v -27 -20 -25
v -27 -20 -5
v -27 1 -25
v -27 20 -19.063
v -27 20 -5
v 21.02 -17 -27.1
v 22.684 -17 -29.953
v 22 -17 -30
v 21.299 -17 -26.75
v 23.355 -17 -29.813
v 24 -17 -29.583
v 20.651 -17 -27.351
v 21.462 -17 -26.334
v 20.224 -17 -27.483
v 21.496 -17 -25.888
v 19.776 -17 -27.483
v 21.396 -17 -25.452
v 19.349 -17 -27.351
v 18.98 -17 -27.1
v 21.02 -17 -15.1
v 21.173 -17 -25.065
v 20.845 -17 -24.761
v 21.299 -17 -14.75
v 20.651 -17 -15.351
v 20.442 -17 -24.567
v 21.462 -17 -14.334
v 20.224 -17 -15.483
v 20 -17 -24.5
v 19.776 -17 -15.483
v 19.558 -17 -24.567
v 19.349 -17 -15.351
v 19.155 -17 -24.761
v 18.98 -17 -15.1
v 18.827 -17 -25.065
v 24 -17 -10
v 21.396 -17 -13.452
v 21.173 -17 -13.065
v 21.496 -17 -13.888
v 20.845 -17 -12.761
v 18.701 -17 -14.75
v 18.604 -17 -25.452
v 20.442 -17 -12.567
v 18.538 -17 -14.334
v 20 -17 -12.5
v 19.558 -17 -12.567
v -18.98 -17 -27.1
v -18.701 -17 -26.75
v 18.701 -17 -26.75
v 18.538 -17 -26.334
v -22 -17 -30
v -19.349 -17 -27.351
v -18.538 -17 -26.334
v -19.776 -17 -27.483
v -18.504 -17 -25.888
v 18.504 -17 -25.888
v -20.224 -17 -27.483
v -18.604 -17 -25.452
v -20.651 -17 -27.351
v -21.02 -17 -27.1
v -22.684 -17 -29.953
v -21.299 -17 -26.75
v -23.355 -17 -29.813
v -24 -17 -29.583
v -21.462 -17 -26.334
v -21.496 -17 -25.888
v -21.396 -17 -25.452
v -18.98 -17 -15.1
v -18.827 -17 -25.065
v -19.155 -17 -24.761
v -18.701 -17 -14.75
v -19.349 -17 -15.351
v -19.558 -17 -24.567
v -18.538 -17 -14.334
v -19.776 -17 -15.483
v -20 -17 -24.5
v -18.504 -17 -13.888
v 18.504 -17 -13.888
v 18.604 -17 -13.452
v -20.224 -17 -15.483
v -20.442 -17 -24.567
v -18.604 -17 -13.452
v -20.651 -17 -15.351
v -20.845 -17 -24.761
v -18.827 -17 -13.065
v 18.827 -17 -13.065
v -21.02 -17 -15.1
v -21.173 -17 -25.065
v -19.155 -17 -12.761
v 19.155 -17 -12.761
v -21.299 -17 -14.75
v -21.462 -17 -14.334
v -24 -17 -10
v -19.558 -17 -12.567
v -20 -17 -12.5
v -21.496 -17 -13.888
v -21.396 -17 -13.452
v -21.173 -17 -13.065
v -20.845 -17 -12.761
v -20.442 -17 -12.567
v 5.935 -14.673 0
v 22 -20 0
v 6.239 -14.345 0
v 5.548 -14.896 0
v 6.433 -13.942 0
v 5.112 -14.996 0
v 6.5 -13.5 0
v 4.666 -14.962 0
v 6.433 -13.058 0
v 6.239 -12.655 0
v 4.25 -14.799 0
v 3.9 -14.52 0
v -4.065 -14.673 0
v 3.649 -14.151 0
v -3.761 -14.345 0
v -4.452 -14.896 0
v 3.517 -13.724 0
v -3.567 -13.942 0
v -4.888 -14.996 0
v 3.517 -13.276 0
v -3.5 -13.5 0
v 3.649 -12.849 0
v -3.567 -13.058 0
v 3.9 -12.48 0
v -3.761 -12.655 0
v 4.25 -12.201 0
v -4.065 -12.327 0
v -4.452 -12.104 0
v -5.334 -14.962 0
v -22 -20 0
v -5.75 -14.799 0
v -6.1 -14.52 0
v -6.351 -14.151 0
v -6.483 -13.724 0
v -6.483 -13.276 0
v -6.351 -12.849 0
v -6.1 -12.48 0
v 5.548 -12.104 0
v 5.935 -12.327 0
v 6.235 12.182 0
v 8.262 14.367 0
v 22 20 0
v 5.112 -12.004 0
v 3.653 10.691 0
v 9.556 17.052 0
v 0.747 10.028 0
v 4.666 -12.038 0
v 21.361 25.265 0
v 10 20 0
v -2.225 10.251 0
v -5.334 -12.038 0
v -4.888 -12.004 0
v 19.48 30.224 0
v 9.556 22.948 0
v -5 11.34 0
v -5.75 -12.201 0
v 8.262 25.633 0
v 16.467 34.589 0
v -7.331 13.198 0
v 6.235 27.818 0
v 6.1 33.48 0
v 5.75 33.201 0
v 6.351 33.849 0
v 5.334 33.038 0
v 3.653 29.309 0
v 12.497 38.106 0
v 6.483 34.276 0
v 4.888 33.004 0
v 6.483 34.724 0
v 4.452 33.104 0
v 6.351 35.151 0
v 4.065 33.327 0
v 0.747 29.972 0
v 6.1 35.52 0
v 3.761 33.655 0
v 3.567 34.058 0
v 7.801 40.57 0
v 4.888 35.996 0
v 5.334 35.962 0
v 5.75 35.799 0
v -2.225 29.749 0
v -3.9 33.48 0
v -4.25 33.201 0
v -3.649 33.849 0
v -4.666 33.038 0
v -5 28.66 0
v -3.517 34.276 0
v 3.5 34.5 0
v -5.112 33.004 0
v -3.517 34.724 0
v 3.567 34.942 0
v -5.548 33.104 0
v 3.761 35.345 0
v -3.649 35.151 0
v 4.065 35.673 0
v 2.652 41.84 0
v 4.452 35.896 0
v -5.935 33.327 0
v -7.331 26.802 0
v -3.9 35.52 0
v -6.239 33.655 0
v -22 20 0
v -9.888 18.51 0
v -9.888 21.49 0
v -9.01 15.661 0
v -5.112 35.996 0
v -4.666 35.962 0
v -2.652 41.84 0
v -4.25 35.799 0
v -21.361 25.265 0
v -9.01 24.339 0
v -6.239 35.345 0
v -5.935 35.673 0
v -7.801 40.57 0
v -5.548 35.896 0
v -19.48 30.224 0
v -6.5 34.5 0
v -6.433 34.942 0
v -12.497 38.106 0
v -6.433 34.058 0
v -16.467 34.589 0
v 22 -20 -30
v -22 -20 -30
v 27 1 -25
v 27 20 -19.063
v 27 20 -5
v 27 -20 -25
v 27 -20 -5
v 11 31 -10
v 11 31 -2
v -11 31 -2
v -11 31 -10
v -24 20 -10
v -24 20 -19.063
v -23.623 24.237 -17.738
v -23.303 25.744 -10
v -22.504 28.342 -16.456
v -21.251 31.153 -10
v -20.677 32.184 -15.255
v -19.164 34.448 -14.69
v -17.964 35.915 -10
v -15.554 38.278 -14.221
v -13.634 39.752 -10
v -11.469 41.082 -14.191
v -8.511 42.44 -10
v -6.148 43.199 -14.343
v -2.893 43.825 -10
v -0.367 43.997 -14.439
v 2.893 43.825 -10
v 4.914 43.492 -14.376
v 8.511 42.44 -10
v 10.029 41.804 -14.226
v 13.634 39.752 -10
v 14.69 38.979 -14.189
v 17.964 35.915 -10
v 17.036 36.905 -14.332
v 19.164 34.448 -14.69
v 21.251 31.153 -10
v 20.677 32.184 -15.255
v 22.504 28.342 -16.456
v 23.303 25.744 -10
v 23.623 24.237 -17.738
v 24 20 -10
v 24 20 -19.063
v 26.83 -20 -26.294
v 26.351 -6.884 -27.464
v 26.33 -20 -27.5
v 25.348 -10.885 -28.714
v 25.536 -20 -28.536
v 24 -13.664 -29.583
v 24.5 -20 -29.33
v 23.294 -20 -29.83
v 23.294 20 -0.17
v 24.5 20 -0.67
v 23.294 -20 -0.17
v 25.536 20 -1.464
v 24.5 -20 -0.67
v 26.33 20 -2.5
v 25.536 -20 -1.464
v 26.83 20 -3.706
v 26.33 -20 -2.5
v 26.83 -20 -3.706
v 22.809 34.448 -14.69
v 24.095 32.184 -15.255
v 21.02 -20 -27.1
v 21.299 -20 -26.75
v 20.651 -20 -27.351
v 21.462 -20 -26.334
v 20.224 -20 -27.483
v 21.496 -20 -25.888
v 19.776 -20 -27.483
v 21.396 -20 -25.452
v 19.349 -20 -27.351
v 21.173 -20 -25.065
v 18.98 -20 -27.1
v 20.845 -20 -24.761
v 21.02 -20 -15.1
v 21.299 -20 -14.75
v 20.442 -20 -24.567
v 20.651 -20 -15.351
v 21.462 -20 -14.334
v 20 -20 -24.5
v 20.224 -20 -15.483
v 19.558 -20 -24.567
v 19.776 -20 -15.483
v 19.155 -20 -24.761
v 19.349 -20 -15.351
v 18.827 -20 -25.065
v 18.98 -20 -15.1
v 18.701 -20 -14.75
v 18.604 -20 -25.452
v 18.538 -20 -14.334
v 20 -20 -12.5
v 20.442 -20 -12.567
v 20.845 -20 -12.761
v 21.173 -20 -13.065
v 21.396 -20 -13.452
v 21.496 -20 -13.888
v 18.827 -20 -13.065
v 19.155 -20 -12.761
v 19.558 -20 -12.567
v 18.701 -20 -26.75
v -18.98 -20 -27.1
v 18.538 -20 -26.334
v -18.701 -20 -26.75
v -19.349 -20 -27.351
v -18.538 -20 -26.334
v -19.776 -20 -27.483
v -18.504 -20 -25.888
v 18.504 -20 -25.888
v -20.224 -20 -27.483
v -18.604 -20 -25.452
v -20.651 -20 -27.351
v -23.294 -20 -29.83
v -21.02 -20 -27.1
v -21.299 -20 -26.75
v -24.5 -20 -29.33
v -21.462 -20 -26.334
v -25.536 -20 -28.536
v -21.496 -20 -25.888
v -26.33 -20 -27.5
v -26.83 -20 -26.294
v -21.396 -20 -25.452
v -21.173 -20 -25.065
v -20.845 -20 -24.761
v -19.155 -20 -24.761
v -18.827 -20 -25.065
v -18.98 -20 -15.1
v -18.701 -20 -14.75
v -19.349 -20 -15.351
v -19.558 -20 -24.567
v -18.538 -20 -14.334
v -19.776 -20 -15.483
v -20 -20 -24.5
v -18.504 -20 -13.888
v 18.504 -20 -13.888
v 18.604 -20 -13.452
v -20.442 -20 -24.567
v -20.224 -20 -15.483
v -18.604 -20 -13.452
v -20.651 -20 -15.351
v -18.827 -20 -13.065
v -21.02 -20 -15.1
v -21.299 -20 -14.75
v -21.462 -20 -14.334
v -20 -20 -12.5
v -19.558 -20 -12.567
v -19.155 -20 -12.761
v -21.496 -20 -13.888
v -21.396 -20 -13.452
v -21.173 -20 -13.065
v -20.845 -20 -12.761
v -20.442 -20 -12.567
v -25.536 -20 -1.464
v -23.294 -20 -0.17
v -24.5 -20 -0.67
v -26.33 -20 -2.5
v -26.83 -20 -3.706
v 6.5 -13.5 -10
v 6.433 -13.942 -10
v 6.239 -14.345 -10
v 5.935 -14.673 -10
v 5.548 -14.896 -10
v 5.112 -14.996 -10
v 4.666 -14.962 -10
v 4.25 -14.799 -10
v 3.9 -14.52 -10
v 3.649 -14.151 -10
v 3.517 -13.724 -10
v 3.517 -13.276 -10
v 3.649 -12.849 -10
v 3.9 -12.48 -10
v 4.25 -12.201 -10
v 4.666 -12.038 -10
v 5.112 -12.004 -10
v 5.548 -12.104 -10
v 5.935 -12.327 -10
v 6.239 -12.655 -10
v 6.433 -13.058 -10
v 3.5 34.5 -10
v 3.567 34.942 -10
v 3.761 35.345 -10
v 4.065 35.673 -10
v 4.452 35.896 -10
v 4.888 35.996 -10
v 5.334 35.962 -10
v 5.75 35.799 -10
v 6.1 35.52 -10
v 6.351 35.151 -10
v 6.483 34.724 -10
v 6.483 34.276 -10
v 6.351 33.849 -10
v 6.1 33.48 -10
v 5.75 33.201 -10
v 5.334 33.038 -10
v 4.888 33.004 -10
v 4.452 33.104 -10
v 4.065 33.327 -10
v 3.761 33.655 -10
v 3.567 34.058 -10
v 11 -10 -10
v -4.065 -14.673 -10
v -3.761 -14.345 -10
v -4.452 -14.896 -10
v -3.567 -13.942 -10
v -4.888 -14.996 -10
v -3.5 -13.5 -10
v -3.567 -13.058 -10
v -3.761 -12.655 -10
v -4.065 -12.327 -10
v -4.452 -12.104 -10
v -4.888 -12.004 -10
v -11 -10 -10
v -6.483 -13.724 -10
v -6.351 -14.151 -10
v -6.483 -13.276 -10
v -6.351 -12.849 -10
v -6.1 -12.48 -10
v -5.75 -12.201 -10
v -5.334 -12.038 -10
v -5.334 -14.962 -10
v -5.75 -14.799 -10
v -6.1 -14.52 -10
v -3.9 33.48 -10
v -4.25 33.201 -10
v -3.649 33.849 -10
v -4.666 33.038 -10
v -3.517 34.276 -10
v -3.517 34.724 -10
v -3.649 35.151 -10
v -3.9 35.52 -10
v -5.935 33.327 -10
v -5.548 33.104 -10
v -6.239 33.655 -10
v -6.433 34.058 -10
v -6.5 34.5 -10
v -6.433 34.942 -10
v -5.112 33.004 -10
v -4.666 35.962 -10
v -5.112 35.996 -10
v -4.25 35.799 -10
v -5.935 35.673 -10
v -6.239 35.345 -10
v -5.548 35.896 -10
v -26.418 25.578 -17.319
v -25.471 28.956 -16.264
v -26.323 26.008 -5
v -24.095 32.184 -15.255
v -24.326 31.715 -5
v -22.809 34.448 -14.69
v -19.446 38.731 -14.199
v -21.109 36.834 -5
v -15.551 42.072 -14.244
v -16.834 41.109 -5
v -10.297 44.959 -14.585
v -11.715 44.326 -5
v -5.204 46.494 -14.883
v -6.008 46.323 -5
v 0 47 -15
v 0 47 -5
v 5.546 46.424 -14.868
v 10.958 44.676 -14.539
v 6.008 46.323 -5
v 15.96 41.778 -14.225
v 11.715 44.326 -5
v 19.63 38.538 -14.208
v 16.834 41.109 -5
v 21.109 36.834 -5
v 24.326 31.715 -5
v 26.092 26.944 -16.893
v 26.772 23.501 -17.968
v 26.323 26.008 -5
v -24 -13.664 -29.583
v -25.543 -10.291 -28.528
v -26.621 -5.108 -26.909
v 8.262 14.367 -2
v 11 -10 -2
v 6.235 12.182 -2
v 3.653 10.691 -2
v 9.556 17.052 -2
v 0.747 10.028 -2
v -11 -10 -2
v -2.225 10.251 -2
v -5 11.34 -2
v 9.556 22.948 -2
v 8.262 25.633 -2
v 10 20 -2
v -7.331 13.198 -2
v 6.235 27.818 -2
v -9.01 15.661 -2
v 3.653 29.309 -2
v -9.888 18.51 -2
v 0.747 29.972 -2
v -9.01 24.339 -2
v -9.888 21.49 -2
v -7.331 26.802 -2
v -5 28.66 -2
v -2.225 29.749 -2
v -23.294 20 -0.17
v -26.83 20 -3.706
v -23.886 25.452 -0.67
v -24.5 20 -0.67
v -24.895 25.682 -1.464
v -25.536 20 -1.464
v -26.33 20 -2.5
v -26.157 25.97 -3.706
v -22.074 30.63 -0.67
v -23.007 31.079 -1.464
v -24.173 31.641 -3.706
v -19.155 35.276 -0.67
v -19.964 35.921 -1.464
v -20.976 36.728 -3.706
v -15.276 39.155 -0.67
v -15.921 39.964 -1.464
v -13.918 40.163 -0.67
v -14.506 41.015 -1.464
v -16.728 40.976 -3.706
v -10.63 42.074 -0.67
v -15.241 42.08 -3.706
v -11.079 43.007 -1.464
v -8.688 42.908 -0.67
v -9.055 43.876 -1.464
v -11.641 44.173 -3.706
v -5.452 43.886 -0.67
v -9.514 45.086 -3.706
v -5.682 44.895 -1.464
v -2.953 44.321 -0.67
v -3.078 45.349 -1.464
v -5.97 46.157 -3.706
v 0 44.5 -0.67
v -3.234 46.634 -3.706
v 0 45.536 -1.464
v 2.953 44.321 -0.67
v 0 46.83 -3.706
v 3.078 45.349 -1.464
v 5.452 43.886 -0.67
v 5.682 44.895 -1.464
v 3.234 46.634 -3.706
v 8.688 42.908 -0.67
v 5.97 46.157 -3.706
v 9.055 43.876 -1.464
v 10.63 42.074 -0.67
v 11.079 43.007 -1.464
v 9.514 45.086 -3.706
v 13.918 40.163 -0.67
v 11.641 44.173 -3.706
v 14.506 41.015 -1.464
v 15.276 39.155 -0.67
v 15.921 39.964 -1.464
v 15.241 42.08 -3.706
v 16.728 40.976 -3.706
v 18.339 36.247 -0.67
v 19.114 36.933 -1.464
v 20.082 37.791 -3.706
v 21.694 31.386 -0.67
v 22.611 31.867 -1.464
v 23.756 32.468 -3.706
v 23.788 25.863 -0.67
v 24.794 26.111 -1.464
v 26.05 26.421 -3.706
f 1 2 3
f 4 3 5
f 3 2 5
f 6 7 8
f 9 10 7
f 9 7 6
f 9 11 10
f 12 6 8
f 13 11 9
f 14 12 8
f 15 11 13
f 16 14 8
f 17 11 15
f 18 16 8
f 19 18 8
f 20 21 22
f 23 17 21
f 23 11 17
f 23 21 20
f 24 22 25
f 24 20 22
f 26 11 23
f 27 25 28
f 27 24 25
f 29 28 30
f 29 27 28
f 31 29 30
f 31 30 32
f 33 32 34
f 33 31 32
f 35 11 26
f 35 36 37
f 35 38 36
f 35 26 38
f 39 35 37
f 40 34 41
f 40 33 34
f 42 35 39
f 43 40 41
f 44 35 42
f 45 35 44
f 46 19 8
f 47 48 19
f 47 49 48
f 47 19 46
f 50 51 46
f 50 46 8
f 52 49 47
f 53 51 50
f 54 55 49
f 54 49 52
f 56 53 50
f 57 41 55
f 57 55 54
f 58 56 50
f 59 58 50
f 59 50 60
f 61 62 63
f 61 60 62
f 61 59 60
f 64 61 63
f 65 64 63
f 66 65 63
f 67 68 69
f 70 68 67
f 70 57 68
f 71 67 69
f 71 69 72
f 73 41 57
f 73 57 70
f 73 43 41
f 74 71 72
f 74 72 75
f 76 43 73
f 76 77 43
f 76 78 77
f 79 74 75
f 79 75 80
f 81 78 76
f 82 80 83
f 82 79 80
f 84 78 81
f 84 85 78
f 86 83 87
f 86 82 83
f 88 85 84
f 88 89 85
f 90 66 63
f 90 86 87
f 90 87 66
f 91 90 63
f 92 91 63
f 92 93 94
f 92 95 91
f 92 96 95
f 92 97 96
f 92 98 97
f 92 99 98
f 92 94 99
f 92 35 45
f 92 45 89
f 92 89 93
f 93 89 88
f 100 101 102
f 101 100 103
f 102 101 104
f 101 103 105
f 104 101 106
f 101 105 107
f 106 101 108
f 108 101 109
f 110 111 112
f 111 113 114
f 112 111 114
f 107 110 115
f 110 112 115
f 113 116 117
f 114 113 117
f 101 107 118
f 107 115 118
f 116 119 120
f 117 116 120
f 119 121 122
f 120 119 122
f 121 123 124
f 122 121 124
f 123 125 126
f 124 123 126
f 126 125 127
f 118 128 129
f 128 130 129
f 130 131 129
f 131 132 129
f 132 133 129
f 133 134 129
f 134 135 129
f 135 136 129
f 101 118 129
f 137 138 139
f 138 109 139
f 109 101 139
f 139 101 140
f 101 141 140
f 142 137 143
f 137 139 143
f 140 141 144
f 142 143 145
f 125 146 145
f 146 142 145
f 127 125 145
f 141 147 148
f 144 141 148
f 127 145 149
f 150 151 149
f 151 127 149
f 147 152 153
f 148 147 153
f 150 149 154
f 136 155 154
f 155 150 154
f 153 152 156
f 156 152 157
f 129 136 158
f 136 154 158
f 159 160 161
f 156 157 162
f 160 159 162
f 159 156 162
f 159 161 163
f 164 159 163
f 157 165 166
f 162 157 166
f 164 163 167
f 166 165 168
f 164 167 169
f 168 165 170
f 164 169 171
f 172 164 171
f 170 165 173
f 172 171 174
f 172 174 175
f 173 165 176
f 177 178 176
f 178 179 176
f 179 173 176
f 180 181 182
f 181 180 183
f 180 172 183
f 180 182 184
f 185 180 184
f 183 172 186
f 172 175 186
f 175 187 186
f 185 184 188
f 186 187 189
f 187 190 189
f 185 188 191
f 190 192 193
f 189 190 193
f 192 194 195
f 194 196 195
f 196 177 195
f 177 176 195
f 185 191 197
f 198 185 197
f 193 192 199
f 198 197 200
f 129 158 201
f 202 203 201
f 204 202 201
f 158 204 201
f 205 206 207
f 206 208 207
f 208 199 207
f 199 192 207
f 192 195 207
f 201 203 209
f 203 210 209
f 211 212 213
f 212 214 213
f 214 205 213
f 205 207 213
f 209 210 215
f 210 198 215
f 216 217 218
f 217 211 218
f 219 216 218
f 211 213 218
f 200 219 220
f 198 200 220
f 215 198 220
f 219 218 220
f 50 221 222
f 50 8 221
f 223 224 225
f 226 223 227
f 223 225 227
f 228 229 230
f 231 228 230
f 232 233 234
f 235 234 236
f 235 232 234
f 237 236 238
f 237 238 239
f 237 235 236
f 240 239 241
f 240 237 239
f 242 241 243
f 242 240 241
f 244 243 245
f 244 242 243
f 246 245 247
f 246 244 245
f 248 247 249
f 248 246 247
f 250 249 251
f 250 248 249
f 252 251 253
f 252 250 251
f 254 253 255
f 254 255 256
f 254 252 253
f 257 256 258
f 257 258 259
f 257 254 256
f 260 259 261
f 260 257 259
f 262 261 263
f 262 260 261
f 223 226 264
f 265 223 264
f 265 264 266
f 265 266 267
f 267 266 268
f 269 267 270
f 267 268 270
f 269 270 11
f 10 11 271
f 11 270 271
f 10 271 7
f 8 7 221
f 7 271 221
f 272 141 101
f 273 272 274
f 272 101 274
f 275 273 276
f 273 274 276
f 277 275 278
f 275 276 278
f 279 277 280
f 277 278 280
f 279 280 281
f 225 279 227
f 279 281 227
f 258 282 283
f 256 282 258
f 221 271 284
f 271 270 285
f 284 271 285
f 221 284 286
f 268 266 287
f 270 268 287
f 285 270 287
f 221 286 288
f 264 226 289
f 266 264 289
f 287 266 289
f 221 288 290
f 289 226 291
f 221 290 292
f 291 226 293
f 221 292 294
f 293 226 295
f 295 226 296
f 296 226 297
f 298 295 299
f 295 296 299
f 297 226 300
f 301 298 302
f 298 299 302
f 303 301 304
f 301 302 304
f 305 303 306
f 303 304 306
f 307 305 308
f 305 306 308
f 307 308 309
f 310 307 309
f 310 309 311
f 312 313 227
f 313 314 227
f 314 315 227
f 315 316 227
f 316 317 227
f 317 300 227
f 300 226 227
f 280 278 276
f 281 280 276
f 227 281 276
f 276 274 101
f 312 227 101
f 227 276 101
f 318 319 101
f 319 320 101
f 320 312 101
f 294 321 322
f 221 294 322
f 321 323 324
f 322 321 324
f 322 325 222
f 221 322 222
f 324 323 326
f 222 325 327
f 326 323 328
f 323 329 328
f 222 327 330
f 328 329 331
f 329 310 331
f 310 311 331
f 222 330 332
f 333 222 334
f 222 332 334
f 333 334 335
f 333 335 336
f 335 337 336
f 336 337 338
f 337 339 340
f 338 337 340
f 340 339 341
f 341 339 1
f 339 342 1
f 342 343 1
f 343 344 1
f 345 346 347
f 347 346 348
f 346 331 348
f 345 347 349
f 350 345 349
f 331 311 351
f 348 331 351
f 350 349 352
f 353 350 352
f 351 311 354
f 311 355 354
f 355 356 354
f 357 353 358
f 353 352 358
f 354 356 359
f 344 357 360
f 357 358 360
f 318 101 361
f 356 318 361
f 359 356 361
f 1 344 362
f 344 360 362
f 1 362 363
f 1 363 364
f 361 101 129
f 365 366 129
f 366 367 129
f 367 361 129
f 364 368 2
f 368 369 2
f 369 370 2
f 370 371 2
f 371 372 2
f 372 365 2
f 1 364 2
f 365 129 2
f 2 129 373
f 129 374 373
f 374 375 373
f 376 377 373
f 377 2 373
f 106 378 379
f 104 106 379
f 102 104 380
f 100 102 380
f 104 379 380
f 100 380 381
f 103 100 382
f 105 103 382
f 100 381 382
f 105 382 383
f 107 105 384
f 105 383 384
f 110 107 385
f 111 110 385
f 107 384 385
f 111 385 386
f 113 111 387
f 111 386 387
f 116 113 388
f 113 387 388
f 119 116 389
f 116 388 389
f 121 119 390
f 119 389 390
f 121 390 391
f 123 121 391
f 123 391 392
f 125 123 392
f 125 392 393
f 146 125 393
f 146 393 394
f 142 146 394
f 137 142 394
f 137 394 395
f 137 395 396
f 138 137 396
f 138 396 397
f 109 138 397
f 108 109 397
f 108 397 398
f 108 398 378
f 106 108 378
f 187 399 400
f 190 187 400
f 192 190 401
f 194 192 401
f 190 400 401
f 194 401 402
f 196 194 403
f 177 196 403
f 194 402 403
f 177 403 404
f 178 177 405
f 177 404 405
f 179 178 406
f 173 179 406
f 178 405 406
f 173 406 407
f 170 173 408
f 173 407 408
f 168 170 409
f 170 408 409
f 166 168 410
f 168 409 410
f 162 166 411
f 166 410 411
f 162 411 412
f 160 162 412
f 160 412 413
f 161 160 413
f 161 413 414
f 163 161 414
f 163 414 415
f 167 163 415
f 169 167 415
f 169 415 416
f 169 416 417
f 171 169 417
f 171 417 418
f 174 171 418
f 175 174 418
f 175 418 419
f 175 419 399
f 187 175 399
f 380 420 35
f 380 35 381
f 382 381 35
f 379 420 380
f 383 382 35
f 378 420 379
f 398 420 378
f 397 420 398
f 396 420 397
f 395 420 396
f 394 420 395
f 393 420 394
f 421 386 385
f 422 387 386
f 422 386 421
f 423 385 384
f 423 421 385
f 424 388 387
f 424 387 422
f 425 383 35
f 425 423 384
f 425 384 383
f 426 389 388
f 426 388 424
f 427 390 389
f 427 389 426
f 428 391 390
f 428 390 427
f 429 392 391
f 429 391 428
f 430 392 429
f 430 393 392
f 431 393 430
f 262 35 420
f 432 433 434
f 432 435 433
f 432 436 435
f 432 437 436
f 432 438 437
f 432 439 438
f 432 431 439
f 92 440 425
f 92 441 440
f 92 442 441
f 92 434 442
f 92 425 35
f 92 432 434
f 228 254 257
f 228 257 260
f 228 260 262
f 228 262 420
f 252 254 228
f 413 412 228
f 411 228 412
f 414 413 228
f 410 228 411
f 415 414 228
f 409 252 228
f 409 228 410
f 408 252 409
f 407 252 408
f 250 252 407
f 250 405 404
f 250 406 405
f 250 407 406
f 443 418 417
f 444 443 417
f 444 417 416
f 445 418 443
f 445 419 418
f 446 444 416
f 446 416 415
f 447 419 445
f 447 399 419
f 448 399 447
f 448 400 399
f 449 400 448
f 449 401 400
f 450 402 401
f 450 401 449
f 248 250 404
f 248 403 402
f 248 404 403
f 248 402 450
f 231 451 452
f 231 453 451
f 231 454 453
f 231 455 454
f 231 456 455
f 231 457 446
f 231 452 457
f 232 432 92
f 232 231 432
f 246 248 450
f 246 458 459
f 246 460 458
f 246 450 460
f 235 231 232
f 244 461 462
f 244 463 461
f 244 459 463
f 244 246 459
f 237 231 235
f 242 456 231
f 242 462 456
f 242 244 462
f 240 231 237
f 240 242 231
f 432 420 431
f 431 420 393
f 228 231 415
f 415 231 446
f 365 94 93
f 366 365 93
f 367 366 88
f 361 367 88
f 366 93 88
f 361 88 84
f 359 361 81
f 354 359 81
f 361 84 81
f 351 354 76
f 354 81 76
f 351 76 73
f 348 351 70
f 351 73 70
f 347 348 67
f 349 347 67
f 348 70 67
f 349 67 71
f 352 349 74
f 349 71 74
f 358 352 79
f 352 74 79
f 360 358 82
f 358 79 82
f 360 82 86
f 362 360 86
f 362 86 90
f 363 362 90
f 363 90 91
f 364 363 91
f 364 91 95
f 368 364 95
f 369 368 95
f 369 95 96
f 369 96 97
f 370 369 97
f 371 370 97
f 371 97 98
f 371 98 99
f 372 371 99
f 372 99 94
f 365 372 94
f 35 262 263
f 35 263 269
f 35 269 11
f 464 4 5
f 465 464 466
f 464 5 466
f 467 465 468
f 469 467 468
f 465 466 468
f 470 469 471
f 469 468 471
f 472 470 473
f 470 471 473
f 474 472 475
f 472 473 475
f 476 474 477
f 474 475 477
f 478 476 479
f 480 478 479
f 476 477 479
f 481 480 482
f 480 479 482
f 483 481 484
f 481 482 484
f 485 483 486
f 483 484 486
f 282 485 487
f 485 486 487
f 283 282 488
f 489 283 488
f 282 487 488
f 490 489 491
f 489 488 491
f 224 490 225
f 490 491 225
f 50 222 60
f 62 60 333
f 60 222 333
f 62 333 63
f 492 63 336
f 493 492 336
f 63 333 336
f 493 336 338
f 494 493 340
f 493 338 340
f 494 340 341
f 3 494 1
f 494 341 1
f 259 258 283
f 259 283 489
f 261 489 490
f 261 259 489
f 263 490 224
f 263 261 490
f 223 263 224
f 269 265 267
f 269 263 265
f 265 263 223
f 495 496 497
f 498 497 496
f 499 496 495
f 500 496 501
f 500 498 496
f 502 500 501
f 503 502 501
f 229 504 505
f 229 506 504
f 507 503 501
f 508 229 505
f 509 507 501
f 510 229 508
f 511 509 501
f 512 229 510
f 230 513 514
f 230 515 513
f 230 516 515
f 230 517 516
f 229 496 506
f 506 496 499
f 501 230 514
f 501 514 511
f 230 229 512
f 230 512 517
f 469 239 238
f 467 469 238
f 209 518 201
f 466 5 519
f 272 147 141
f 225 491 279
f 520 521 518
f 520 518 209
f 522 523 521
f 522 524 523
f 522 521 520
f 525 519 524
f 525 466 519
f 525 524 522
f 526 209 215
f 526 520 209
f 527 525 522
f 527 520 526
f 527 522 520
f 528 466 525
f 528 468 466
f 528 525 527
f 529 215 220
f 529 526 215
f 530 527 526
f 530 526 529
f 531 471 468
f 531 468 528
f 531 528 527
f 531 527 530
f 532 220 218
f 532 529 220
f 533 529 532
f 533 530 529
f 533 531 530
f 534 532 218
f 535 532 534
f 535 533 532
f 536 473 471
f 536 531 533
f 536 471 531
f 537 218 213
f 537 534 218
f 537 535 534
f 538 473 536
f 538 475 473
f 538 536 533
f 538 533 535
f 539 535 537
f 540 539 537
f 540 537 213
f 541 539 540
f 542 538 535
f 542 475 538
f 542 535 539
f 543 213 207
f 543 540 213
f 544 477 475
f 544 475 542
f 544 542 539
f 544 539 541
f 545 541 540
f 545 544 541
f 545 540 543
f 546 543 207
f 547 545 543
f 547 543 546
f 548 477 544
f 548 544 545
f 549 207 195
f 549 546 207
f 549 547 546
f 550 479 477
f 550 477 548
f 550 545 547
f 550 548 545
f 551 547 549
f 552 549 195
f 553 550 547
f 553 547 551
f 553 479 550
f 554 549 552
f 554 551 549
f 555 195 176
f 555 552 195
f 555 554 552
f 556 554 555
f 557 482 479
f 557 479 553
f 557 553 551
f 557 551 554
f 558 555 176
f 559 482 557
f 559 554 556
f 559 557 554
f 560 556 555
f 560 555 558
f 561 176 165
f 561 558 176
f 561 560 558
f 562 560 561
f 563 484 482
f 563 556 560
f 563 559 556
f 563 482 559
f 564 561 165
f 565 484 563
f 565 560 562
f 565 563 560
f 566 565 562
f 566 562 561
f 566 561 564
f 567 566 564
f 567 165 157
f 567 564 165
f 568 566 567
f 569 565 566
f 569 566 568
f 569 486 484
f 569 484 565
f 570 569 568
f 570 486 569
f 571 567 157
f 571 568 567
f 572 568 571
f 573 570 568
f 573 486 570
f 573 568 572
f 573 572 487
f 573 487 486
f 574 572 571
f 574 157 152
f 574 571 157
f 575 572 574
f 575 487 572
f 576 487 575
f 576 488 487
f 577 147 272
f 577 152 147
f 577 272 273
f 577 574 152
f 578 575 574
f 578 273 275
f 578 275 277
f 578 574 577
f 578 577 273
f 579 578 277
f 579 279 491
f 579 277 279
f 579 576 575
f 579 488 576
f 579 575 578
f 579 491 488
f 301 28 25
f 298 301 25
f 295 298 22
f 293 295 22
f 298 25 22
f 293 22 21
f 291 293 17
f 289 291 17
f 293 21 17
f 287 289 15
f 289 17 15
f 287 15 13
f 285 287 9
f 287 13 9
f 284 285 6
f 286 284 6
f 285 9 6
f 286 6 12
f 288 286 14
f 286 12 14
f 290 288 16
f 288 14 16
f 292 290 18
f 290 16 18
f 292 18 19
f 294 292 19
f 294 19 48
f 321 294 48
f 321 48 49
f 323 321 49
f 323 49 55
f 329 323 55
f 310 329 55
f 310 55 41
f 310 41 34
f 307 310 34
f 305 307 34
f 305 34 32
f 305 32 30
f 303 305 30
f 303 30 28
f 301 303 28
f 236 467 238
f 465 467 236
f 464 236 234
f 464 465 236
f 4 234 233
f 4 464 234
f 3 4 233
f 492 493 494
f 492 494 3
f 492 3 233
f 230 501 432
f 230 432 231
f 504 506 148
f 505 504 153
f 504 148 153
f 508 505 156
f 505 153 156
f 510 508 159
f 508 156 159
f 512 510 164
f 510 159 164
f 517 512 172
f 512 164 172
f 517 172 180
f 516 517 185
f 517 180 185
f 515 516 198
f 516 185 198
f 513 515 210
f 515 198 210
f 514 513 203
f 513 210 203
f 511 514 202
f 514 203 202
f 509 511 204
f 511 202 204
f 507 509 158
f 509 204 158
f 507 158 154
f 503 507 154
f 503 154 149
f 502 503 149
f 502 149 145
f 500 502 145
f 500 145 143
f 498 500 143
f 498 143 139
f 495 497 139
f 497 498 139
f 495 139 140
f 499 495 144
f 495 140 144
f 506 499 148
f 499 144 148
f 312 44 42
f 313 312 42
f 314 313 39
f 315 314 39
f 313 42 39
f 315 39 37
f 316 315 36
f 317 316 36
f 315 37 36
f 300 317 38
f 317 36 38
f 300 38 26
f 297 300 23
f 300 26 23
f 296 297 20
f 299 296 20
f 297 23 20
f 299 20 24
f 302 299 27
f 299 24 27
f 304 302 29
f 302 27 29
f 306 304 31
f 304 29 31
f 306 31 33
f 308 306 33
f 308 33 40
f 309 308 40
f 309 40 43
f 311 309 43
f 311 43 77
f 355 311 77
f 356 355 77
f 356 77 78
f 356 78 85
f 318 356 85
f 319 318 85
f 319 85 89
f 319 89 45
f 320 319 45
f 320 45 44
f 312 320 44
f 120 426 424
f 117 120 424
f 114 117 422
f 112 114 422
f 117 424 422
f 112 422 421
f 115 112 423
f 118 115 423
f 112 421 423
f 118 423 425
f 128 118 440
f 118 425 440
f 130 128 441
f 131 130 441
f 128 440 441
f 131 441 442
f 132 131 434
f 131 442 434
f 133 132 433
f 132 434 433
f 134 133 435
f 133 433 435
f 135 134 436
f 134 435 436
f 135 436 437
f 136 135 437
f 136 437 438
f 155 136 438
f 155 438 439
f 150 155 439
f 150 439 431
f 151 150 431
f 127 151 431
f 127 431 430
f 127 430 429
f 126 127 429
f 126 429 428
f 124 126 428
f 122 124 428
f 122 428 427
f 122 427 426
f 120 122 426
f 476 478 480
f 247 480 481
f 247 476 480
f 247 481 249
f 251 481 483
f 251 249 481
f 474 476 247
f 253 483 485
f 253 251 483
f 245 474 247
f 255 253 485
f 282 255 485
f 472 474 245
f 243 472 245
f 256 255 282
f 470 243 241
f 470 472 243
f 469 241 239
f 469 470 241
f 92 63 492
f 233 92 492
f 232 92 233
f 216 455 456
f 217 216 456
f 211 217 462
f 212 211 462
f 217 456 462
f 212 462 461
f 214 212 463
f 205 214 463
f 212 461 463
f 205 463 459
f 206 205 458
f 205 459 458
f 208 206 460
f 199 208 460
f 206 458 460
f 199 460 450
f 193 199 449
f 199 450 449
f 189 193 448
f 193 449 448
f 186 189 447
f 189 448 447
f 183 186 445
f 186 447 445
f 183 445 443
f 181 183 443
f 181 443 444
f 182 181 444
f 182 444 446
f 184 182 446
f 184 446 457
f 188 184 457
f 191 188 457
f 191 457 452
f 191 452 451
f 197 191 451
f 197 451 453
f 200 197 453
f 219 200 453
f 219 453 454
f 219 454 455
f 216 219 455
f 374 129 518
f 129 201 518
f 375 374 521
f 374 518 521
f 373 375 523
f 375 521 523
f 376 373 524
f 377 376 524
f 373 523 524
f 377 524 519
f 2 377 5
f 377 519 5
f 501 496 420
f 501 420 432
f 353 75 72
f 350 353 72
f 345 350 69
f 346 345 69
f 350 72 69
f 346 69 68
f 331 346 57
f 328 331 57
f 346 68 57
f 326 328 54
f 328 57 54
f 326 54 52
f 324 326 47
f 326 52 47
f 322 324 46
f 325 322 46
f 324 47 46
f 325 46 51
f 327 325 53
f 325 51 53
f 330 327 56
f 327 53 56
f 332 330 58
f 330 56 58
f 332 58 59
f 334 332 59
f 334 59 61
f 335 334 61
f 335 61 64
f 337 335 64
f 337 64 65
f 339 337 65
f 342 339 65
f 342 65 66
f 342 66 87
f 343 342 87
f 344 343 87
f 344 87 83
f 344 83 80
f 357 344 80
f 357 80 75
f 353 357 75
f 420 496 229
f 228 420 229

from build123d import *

# Parameters (mm, degrees)
BOSS_EXTRUDE1_DEPTH     = 30
SKETCH3_4_R             = 10
BOSS_EXTRUDE2_DEPTH     = 10
CUT_EXTRUDE2_DEPTH      = 62.951594007
CUT_EXTRUDE2_DEPTH_BACK = 62.951594007
CUT_EXTRUDE3_START      = -8
SKETCH6_W               = 22
SKETCH6_H               = 41
SKETCH6_R               = 10
CUT_EXTRUDE3_DEPTH      = 8
SKETCH6_3_R             = 1.5
CUT_EXTRUDE4_DEPTH      = 58.775427431
CUT_EXTRUDE5_DEPTH      = 79.217645188
SKETCH8_R               = 1.5
CUT_EXTRUDE6_DEPTH      = 76.663729872
FILLET1_R               = 5


with BuildPart() as part:
    # Sketch3 → Boss-Extrude1 (new body)
    with BuildSketch(Plane.XY):
        with BuildLine():
            Line((-27, 20), (-27, -20))
            Line((-27, -20), (27, -20))
            Line((27, -20), (27, 20))
            ThreePointArc((27, 20), (0, 47), (-27, 20))
        make_face()
        with BuildLine():
            Line((24, -17), (-24, -17))
            Line((-24, -17), (-24, 20))
            ThreePointArc((-24, 20), (0, 44), (24, 20))
            Line((24, 20), (24, -17))
        make_face(mode=Mode.SUBTRACT)
    extrude(amount=-BOSS_EXTRUDE1_DEPTH)

    # Sketch3<4> → Boss-Extrude2 (add)
    with BuildSketch(Plane.XY):
        with BuildLine():
            Line((-24, 20), (-24, -17))
            Line((-24, -17), (24, -17))
            Line((24, -17), (24, 20))
            ThreePointArc((24, 20), (0, 44), (-24, 20))
        make_face()
        with Locations((0, 20)):
            Circle(SKETCH3_4_R, mode=Mode.SUBTRACT)
    extrude(amount=-BOSS_EXTRUDE2_DEPTH)

    # Sketch5 → Cut-Extrude2 (cut, two sides: drawn at the far end of the back side and taken through both)
    with BuildSketch(Plane(origin=(0, 0, 0), x_dir=(0, 0, -1), z_dir=(1, 0, 0)).offset(-CUT_EXTRUDE2_DEPTH_BACK)):
        with BuildLine():
            Line((15.255034443, 32.183889783), (30, -15))
            Line((30, -15), (30, 47))
            Line((30, 47), (15, 47))
            ThreePointArc((15, 47), (14.181044165, 40.740478791), (14.690093427, 34.448168938))
            ThreePointArc((14.690093427, 34.448168938), (14.93950997, 33.307782347), (15.255034443, 32.183889783))
        make_face()
    extrude(amount=CUT_EXTRUDE2_DEPTH + CUT_EXTRUDE2_DEPTH_BACK, mode=Mode.SUBTRACT)

    # Sketch6 → Cut-Extrude3 (cut)
    with BuildSketch(Plane(origin=(0, 0, -10), x_dir=(-1, 0, 0), z_dir=(0, 0, -1)).offset(CUT_EXTRUDE3_START)):
        with Locations((0, 10.5)):
            Rectangle(SKETCH6_W, SKETCH6_H)
        with Locations((0, 20)):
            Circle(SKETCH6_R, mode=Mode.SUBTRACT)
    extrude(amount=CUT_EXTRUDE3_DEPTH, mode=Mode.SUBTRACT)

    # Sketch6<3> → Cut-Extrude4 (cut, through all)
    with BuildSketch(Plane(origin=(0, 0, -10), x_dir=(-1, 0, 0), z_dir=(0, 0, -1))):
        with Locations((-5, 34.5)):
            Circle(SKETCH6_3_R)
        with Locations((5, 34.5)):
            Circle(SKETCH6_3_R)
        with Locations((5, -13.5)):
            Circle(SKETCH6_3_R)
        with Locations((-5, -13.5)):
            Circle(SKETCH6_3_R)
    extrude(amount=-CUT_EXTRUDE4_DEPTH, mode=Mode.SUBTRACT)

    # Sketch7 → Cut-Extrude5 (cut, through all)
    with BuildSketch(Plane.XZ.offset(20)):
        with BuildLine():
            Line((-27, -25), (-27, -30))
            Line((-27, -30), (-22, -30))
            ThreePointArc((-22, -30), (-25.535533906, -28.535533906), (-27, -25))
        make_face()
        with BuildLine():
            Line((22, -30), (27, -30))
            Line((27, -30), (27, -25))
            ThreePointArc((27, -25), (25.535533906, -28.535533906), (22, -30))
        make_face()
    extrude(amount=-CUT_EXTRUDE5_DEPTH, mode=Mode.SUBTRACT)

    # Sketch8 → Cut-Extrude6 (cut, through all)
    with BuildSketch(Plane(origin=(0, -17, 0), x_dir=(1, 0, 0), z_dir=(0, 1, 0))):
        with Locations((-20, 26)):
            Circle(SKETCH8_R)
        with Locations((20, 26)):
            Circle(SKETCH8_R)
        with Locations((20, 14)):
            Circle(SKETCH8_R)
        with Locations((-20, 14)):
            Circle(SKETCH8_R)
    extrude(amount=-CUT_EXTRUDE6_DEPTH, mode=Mode.SUBTRACT)

    # Fillet1
    fillet1_edges = [part.edges().sort_by_distance(p)[0] for p in [
        (-27, 0, 0),
        (0, 47, 0),
        (27, 0, 0),
    ]]
    fillet(fillet1_edges, radius=FILLET1_R)


solid = part.part
